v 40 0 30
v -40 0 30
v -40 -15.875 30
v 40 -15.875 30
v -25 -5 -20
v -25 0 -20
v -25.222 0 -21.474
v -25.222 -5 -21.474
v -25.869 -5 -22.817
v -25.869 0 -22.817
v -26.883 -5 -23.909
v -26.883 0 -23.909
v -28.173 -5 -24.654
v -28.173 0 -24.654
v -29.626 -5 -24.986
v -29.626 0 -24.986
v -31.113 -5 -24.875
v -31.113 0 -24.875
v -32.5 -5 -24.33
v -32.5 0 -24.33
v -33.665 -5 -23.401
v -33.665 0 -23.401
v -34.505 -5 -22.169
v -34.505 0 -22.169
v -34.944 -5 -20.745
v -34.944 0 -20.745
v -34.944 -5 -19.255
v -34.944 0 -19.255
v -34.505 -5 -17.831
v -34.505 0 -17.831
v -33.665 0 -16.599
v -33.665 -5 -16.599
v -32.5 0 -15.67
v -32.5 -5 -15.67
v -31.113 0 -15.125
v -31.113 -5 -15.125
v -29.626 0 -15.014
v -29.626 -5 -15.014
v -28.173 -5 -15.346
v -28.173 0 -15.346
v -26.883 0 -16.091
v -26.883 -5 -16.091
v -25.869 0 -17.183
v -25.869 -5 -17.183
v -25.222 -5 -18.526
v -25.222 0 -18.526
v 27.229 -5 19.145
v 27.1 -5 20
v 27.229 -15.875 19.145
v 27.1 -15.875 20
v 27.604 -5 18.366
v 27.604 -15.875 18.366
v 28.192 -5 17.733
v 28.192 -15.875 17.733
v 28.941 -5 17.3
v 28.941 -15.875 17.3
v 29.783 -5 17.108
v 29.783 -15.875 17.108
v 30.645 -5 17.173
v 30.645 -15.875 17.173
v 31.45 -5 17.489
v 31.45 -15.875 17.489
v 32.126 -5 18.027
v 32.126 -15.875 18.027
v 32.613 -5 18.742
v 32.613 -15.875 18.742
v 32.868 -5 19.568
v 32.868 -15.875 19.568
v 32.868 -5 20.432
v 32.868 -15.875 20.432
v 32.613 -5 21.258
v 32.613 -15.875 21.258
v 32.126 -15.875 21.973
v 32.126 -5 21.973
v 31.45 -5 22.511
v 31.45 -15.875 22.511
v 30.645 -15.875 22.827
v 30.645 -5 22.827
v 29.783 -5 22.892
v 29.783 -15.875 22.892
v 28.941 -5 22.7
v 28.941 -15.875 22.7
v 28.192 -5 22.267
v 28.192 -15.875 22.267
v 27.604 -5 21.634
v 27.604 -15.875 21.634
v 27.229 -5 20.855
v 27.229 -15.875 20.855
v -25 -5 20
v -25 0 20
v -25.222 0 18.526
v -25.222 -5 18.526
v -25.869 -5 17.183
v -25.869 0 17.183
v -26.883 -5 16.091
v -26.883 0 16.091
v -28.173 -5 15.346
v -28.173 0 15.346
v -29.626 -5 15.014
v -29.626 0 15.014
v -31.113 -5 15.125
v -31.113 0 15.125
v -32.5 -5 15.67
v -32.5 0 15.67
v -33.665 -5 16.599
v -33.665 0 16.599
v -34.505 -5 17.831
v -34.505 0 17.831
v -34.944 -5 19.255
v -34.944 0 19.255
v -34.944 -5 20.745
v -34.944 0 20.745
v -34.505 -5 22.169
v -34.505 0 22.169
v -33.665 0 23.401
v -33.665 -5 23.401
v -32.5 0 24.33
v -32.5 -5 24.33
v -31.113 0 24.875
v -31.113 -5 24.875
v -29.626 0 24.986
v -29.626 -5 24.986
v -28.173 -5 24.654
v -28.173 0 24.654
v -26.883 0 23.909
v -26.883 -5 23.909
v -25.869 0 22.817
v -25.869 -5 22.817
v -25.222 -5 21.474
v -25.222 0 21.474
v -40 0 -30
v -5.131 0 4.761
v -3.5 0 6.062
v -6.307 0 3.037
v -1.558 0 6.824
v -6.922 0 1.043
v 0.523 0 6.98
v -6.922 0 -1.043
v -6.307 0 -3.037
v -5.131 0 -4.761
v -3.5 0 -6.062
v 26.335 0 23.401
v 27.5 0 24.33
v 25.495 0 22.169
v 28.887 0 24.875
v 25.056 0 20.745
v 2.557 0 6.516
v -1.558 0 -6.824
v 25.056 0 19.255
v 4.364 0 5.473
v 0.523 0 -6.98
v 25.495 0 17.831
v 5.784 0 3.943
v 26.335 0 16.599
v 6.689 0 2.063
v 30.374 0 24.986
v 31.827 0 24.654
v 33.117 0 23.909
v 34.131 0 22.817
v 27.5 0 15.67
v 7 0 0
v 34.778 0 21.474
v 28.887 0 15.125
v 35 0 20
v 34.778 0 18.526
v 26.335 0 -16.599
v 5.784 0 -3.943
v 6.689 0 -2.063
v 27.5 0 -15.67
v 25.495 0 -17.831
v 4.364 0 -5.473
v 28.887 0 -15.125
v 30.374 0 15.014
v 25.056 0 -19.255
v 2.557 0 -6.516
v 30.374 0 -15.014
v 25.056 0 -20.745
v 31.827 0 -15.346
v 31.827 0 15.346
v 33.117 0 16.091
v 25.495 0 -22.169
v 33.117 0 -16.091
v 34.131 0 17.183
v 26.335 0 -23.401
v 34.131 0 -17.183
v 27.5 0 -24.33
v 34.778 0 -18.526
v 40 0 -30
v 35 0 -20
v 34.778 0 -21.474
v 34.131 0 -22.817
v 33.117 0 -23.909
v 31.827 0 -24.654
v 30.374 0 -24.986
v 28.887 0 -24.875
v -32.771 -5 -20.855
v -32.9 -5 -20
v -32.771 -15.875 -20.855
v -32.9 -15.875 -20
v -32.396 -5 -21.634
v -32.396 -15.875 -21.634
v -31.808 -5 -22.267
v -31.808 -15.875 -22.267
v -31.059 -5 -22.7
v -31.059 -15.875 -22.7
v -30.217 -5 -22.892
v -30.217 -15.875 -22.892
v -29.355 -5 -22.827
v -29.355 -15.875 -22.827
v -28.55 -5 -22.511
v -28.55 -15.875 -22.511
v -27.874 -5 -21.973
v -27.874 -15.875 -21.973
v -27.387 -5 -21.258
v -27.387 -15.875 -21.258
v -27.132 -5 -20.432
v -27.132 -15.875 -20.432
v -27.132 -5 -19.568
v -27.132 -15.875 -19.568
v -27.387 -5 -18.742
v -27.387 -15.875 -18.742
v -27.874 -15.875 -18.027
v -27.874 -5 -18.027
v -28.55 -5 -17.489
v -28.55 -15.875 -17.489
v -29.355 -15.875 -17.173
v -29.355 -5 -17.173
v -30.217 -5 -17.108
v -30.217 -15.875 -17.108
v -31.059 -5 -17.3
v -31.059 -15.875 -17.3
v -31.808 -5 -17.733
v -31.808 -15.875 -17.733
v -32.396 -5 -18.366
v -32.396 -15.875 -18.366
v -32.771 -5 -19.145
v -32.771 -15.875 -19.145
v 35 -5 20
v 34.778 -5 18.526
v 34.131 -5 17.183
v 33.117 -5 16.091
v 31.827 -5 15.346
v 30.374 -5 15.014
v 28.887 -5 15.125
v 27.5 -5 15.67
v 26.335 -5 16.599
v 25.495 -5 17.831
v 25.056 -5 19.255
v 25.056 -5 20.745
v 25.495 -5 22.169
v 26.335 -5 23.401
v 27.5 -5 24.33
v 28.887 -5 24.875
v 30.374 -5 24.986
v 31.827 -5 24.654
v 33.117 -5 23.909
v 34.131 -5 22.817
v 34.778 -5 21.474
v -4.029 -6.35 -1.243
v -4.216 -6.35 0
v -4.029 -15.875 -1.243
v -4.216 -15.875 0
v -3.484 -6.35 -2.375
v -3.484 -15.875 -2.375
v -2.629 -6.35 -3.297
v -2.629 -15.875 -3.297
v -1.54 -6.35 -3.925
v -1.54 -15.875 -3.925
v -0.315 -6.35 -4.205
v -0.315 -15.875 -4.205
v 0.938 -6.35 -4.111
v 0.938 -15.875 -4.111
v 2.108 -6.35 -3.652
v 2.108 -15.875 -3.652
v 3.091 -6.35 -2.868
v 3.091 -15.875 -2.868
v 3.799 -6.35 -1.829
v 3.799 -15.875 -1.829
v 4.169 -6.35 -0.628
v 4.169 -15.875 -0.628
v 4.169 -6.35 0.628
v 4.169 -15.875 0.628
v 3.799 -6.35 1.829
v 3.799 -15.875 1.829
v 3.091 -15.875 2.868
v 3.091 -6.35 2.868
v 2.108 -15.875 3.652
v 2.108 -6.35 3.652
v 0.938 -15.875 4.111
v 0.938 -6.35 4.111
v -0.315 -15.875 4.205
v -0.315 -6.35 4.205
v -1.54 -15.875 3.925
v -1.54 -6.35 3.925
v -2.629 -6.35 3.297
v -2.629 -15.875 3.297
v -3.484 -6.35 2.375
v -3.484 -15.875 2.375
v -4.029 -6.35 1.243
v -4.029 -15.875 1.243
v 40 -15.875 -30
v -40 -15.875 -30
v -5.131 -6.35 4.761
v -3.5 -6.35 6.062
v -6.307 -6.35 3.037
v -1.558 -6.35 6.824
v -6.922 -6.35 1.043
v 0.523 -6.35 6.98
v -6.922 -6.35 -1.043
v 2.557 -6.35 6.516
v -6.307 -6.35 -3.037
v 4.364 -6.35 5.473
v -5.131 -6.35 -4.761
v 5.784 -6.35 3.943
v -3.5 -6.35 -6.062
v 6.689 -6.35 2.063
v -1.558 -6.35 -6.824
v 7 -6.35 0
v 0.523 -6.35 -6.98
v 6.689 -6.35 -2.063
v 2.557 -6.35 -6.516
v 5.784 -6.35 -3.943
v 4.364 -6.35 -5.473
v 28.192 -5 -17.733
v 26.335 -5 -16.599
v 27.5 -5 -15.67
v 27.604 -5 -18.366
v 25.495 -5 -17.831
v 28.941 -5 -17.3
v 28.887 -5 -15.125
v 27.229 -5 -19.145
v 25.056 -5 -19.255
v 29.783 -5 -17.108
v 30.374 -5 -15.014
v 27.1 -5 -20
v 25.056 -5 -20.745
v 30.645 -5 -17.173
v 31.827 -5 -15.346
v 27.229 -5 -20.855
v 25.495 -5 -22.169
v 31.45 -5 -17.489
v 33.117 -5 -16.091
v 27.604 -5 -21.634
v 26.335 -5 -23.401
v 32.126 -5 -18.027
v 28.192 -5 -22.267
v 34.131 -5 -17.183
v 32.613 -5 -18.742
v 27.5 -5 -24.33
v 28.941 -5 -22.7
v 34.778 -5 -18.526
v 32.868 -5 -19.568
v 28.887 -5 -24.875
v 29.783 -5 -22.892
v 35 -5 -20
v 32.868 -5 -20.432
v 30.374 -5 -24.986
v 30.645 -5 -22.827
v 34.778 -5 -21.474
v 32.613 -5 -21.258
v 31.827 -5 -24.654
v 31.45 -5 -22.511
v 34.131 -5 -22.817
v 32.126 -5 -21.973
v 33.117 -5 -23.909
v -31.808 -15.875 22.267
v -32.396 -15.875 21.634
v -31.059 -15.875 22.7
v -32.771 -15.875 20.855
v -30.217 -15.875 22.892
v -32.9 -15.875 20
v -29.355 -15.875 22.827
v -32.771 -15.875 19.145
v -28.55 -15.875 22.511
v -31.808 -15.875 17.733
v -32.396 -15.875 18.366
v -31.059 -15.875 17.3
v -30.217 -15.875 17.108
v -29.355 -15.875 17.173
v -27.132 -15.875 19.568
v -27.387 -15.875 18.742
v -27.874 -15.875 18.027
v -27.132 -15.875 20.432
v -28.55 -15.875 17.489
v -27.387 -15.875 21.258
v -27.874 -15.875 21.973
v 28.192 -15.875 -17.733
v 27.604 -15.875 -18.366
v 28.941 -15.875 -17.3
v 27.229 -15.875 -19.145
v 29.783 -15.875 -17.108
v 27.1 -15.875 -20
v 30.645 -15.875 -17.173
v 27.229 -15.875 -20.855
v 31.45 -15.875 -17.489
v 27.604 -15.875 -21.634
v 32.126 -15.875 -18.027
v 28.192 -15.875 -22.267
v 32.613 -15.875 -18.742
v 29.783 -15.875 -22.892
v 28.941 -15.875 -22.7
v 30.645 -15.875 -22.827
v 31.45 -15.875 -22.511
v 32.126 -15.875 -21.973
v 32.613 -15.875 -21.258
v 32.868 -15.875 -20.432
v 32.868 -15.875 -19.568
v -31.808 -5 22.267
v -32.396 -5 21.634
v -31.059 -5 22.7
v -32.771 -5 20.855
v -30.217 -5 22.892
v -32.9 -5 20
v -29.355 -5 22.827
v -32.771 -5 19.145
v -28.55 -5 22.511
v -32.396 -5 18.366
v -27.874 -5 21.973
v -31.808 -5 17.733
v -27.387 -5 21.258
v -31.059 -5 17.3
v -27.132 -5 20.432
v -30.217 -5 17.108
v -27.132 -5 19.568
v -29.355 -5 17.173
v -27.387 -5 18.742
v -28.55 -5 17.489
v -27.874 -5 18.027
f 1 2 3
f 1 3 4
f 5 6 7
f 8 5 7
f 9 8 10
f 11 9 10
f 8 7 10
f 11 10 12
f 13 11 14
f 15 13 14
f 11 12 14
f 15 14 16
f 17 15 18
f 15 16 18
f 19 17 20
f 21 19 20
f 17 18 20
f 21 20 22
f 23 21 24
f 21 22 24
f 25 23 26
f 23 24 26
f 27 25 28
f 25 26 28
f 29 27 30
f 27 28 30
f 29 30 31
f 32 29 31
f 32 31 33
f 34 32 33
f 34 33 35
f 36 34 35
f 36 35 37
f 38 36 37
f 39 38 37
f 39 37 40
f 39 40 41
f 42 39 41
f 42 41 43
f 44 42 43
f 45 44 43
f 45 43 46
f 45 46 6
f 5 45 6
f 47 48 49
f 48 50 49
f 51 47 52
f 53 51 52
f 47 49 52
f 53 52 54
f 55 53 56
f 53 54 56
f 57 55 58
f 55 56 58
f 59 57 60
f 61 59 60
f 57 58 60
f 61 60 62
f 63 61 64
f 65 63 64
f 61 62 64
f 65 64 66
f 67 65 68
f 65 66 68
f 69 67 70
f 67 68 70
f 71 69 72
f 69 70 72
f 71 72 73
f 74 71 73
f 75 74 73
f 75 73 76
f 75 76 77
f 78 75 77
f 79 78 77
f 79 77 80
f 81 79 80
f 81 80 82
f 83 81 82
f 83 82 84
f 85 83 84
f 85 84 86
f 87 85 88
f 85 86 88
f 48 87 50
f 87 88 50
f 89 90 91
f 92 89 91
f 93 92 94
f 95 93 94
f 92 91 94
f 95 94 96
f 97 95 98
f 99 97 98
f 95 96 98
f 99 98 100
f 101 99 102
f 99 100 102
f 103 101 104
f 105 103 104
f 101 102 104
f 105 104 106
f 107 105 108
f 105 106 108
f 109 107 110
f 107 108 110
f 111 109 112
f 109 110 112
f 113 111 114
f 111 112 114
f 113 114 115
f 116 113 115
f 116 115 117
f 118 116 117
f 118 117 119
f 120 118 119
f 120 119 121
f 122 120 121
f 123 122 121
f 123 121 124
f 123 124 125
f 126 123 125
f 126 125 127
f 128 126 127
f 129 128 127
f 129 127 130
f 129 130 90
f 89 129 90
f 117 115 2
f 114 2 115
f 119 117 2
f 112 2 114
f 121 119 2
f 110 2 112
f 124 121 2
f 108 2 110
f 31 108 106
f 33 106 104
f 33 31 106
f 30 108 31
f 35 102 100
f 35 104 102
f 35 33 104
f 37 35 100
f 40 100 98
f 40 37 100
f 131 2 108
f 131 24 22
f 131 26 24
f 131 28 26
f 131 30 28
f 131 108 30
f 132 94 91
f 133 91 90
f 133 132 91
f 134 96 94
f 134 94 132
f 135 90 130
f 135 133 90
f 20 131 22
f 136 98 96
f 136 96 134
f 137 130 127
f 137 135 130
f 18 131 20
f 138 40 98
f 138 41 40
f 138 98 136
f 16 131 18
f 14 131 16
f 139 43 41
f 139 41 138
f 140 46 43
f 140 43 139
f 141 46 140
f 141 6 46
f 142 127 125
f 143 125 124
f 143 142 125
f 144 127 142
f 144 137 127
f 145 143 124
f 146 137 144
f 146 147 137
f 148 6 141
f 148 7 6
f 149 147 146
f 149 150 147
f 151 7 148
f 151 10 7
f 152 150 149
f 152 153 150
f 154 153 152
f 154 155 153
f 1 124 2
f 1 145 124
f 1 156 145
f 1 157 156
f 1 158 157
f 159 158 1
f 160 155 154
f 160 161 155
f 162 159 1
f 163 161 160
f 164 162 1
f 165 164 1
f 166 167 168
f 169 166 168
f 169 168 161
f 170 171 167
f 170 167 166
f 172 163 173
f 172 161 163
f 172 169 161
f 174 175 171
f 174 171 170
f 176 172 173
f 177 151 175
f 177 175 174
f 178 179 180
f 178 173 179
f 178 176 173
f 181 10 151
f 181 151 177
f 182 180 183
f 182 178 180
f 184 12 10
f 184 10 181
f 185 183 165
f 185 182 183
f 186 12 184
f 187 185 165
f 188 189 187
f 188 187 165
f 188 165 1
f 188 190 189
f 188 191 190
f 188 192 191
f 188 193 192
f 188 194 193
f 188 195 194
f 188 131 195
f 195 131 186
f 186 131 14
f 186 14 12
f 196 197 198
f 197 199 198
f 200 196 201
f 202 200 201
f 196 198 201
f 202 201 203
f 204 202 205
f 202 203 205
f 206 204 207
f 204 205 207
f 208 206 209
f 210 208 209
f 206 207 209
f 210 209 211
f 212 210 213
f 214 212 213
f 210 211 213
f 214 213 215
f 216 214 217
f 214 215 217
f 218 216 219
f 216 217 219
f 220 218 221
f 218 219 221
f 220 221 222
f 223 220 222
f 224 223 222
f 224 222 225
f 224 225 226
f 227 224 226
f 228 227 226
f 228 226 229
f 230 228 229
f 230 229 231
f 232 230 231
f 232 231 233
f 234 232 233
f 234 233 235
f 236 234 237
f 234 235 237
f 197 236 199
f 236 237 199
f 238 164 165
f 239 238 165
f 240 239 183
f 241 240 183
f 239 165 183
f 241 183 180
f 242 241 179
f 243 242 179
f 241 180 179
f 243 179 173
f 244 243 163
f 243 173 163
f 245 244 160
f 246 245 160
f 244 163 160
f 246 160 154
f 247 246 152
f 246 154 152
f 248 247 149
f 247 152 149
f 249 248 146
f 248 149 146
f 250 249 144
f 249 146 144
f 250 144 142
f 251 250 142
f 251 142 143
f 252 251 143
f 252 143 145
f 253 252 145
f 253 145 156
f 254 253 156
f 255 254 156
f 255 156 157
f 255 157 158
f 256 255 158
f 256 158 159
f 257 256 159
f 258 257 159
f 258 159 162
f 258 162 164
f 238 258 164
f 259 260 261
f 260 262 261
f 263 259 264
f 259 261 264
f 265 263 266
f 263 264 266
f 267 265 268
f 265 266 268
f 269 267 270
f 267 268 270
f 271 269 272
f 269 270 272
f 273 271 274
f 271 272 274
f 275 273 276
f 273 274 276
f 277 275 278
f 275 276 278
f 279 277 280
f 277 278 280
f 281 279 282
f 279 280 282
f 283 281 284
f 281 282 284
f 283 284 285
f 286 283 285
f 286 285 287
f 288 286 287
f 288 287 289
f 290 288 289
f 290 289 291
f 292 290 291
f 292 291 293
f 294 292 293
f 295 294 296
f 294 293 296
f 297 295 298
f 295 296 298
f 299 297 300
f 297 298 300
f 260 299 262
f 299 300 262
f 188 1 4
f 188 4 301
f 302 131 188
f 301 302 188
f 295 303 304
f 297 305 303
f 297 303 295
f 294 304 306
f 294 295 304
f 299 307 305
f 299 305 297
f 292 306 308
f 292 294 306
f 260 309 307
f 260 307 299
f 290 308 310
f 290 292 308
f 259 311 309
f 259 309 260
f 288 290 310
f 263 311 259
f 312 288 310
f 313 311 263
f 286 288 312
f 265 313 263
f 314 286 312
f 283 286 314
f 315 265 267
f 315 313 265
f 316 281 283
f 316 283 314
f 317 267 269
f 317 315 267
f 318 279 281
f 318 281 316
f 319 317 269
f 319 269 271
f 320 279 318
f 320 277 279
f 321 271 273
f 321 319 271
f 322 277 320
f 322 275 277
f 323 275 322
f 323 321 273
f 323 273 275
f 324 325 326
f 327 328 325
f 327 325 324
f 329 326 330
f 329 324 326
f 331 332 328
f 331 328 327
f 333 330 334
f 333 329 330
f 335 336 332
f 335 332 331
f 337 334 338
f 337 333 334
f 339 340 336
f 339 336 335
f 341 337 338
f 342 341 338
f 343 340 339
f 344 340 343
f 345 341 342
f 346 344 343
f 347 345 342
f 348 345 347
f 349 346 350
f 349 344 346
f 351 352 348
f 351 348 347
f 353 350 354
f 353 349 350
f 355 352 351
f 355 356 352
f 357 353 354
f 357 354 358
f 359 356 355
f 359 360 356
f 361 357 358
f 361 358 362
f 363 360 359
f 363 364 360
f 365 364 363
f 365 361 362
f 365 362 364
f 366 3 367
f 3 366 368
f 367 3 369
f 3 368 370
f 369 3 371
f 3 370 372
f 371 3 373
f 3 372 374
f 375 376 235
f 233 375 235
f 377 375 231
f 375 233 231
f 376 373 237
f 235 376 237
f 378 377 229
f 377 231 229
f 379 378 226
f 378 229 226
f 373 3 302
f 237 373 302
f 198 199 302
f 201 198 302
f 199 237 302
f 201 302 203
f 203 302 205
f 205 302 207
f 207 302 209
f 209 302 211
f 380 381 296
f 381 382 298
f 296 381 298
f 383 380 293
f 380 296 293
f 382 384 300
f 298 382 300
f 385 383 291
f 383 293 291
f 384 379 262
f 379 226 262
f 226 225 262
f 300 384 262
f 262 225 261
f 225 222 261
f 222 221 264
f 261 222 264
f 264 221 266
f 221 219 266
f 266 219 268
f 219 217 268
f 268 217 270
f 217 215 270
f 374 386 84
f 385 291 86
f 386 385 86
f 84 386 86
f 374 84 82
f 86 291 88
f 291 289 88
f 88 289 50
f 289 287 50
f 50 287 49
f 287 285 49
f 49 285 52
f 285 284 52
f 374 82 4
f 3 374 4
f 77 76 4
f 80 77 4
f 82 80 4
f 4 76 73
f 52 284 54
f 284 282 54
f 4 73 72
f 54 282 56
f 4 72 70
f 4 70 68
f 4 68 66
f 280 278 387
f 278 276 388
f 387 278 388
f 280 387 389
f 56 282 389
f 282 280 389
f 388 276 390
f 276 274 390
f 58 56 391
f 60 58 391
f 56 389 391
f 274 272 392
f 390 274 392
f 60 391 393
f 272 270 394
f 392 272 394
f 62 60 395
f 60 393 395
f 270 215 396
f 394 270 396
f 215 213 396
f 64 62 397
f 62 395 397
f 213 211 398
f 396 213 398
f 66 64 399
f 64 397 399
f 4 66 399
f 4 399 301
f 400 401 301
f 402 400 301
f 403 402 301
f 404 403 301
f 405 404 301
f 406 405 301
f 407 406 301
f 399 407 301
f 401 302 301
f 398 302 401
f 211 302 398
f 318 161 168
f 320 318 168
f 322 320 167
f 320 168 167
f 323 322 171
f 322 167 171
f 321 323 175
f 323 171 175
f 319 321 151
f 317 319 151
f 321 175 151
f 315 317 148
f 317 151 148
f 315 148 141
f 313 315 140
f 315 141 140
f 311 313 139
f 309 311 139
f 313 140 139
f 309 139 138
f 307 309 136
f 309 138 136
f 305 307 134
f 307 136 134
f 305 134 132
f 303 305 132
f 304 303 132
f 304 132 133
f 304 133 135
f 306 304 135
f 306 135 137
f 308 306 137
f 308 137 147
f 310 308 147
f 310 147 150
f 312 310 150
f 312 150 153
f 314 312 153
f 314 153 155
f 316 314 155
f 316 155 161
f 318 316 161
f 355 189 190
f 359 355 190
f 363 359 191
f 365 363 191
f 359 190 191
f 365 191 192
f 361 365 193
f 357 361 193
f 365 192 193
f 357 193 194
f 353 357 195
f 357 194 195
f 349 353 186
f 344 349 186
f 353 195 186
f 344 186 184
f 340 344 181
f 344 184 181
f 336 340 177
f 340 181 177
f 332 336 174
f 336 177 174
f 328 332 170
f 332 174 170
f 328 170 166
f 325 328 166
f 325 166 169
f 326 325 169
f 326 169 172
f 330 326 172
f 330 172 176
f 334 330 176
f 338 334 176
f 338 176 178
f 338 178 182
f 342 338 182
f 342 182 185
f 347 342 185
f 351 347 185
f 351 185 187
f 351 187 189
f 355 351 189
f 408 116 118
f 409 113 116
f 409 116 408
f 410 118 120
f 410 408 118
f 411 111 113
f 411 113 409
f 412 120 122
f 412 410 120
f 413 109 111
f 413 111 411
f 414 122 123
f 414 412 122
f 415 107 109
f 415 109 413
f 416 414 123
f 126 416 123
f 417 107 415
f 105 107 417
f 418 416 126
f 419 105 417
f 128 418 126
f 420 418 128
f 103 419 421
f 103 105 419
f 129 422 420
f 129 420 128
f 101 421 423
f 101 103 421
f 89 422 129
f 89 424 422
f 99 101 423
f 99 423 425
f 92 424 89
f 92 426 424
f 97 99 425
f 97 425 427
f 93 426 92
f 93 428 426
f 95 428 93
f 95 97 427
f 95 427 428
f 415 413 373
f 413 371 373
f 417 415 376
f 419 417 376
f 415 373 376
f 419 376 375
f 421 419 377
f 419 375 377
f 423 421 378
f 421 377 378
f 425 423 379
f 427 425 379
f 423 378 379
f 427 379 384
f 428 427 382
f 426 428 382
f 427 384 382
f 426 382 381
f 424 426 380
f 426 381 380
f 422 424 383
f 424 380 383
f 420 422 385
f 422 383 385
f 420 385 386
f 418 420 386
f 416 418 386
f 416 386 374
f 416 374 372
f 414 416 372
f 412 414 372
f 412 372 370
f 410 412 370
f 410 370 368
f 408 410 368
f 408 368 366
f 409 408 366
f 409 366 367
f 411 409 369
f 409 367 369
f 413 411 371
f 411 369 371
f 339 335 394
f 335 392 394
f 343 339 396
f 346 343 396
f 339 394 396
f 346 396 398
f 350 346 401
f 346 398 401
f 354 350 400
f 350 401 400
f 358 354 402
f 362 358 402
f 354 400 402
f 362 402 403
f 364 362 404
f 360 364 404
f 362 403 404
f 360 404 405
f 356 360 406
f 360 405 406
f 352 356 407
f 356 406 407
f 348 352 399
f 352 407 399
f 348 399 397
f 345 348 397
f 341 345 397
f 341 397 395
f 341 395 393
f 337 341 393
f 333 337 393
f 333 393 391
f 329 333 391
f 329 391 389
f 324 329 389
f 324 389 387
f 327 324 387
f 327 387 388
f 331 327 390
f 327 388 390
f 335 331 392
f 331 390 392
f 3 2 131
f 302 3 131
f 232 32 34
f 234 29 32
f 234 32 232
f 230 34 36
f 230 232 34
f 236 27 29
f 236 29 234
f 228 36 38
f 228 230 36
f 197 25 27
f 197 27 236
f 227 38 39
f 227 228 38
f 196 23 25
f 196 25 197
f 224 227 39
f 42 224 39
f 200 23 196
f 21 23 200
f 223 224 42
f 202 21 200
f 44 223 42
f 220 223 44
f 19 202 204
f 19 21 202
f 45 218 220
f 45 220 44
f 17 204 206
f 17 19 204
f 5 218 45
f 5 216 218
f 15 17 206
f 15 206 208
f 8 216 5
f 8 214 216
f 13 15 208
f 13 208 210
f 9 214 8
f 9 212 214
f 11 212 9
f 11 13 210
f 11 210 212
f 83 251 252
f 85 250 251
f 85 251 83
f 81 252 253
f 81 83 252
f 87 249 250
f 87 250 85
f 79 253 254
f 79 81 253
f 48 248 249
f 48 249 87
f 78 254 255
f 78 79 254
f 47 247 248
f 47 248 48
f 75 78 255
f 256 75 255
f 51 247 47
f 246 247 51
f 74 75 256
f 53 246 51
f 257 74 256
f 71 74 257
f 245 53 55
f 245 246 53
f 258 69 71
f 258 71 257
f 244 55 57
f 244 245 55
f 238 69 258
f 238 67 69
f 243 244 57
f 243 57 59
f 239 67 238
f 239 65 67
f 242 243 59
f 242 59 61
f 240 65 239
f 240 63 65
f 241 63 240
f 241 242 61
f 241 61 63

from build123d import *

# Parameters (mm, degrees)
SKETCH1_W                         = 80
SKETCH1_H                         = 60
BASE_FLANGE1_DEPTH                = 15.875
CBORE_FOR_M5_SHCS1_D              = 5.8
CBORE_FOR_M5_SHCS1_CBORE_D        = 10
CBORE_FOR_M5_SHCS1_CBORE_DEPTH    = 5
F_3_8_24_TAPPED_HOLE1_D           = 8.4328
F_3_8_24_TAPPED_HOLE1_CBORE_D     = 14
F_3_8_24_TAPPED_HOLE1_CBORE_DEPTH = 6.35


# Sheet-metal steps are written as plain solids
with BuildPart() as part:
    # Sketch1 → Base-Flange1 (new body)
    with BuildSketch(Plane(origin=(0, 0, 0), x_dir=(1, 0, 0), z_dir=(0, 1, 0))):
        Rectangle(SKETCH1_W, SKETCH1_H)
    extrude(amount=-BASE_FLANGE1_DEPTH)

    # CBORE for M5 SHCS1 (through all)
    with Locations(Plane(origin=(0, 0, 0), x_dir=(1, 0, 0), z_dir=(0, 1, 0))):
        with Locations((-30, -20), (-30, 20), (30, 20), (30, -20)):
            CounterBoreHole(CBORE_FOR_M5_SHCS1_D / 2, CBORE_FOR_M5_SHCS1_CBORE_D / 2, CBORE_FOR_M5_SHCS1_CBORE_DEPTH)

    # 3/8-24 Tapped Hole1 (through all)
    with Locations(Plane(origin=(0, 0, 0), x_dir=(1, 0, 0), z_dir=(0, 1, 0))):
        with Locations((0, 0)):
            CounterBoreHole(F_3_8_24_TAPPED_HOLE1_D / 2, F_3_8_24_TAPPED_HOLE1_CBORE_D / 2, F_3_8_24_TAPPED_HOLE1_CBORE_DEPTH)


solid = part.part
